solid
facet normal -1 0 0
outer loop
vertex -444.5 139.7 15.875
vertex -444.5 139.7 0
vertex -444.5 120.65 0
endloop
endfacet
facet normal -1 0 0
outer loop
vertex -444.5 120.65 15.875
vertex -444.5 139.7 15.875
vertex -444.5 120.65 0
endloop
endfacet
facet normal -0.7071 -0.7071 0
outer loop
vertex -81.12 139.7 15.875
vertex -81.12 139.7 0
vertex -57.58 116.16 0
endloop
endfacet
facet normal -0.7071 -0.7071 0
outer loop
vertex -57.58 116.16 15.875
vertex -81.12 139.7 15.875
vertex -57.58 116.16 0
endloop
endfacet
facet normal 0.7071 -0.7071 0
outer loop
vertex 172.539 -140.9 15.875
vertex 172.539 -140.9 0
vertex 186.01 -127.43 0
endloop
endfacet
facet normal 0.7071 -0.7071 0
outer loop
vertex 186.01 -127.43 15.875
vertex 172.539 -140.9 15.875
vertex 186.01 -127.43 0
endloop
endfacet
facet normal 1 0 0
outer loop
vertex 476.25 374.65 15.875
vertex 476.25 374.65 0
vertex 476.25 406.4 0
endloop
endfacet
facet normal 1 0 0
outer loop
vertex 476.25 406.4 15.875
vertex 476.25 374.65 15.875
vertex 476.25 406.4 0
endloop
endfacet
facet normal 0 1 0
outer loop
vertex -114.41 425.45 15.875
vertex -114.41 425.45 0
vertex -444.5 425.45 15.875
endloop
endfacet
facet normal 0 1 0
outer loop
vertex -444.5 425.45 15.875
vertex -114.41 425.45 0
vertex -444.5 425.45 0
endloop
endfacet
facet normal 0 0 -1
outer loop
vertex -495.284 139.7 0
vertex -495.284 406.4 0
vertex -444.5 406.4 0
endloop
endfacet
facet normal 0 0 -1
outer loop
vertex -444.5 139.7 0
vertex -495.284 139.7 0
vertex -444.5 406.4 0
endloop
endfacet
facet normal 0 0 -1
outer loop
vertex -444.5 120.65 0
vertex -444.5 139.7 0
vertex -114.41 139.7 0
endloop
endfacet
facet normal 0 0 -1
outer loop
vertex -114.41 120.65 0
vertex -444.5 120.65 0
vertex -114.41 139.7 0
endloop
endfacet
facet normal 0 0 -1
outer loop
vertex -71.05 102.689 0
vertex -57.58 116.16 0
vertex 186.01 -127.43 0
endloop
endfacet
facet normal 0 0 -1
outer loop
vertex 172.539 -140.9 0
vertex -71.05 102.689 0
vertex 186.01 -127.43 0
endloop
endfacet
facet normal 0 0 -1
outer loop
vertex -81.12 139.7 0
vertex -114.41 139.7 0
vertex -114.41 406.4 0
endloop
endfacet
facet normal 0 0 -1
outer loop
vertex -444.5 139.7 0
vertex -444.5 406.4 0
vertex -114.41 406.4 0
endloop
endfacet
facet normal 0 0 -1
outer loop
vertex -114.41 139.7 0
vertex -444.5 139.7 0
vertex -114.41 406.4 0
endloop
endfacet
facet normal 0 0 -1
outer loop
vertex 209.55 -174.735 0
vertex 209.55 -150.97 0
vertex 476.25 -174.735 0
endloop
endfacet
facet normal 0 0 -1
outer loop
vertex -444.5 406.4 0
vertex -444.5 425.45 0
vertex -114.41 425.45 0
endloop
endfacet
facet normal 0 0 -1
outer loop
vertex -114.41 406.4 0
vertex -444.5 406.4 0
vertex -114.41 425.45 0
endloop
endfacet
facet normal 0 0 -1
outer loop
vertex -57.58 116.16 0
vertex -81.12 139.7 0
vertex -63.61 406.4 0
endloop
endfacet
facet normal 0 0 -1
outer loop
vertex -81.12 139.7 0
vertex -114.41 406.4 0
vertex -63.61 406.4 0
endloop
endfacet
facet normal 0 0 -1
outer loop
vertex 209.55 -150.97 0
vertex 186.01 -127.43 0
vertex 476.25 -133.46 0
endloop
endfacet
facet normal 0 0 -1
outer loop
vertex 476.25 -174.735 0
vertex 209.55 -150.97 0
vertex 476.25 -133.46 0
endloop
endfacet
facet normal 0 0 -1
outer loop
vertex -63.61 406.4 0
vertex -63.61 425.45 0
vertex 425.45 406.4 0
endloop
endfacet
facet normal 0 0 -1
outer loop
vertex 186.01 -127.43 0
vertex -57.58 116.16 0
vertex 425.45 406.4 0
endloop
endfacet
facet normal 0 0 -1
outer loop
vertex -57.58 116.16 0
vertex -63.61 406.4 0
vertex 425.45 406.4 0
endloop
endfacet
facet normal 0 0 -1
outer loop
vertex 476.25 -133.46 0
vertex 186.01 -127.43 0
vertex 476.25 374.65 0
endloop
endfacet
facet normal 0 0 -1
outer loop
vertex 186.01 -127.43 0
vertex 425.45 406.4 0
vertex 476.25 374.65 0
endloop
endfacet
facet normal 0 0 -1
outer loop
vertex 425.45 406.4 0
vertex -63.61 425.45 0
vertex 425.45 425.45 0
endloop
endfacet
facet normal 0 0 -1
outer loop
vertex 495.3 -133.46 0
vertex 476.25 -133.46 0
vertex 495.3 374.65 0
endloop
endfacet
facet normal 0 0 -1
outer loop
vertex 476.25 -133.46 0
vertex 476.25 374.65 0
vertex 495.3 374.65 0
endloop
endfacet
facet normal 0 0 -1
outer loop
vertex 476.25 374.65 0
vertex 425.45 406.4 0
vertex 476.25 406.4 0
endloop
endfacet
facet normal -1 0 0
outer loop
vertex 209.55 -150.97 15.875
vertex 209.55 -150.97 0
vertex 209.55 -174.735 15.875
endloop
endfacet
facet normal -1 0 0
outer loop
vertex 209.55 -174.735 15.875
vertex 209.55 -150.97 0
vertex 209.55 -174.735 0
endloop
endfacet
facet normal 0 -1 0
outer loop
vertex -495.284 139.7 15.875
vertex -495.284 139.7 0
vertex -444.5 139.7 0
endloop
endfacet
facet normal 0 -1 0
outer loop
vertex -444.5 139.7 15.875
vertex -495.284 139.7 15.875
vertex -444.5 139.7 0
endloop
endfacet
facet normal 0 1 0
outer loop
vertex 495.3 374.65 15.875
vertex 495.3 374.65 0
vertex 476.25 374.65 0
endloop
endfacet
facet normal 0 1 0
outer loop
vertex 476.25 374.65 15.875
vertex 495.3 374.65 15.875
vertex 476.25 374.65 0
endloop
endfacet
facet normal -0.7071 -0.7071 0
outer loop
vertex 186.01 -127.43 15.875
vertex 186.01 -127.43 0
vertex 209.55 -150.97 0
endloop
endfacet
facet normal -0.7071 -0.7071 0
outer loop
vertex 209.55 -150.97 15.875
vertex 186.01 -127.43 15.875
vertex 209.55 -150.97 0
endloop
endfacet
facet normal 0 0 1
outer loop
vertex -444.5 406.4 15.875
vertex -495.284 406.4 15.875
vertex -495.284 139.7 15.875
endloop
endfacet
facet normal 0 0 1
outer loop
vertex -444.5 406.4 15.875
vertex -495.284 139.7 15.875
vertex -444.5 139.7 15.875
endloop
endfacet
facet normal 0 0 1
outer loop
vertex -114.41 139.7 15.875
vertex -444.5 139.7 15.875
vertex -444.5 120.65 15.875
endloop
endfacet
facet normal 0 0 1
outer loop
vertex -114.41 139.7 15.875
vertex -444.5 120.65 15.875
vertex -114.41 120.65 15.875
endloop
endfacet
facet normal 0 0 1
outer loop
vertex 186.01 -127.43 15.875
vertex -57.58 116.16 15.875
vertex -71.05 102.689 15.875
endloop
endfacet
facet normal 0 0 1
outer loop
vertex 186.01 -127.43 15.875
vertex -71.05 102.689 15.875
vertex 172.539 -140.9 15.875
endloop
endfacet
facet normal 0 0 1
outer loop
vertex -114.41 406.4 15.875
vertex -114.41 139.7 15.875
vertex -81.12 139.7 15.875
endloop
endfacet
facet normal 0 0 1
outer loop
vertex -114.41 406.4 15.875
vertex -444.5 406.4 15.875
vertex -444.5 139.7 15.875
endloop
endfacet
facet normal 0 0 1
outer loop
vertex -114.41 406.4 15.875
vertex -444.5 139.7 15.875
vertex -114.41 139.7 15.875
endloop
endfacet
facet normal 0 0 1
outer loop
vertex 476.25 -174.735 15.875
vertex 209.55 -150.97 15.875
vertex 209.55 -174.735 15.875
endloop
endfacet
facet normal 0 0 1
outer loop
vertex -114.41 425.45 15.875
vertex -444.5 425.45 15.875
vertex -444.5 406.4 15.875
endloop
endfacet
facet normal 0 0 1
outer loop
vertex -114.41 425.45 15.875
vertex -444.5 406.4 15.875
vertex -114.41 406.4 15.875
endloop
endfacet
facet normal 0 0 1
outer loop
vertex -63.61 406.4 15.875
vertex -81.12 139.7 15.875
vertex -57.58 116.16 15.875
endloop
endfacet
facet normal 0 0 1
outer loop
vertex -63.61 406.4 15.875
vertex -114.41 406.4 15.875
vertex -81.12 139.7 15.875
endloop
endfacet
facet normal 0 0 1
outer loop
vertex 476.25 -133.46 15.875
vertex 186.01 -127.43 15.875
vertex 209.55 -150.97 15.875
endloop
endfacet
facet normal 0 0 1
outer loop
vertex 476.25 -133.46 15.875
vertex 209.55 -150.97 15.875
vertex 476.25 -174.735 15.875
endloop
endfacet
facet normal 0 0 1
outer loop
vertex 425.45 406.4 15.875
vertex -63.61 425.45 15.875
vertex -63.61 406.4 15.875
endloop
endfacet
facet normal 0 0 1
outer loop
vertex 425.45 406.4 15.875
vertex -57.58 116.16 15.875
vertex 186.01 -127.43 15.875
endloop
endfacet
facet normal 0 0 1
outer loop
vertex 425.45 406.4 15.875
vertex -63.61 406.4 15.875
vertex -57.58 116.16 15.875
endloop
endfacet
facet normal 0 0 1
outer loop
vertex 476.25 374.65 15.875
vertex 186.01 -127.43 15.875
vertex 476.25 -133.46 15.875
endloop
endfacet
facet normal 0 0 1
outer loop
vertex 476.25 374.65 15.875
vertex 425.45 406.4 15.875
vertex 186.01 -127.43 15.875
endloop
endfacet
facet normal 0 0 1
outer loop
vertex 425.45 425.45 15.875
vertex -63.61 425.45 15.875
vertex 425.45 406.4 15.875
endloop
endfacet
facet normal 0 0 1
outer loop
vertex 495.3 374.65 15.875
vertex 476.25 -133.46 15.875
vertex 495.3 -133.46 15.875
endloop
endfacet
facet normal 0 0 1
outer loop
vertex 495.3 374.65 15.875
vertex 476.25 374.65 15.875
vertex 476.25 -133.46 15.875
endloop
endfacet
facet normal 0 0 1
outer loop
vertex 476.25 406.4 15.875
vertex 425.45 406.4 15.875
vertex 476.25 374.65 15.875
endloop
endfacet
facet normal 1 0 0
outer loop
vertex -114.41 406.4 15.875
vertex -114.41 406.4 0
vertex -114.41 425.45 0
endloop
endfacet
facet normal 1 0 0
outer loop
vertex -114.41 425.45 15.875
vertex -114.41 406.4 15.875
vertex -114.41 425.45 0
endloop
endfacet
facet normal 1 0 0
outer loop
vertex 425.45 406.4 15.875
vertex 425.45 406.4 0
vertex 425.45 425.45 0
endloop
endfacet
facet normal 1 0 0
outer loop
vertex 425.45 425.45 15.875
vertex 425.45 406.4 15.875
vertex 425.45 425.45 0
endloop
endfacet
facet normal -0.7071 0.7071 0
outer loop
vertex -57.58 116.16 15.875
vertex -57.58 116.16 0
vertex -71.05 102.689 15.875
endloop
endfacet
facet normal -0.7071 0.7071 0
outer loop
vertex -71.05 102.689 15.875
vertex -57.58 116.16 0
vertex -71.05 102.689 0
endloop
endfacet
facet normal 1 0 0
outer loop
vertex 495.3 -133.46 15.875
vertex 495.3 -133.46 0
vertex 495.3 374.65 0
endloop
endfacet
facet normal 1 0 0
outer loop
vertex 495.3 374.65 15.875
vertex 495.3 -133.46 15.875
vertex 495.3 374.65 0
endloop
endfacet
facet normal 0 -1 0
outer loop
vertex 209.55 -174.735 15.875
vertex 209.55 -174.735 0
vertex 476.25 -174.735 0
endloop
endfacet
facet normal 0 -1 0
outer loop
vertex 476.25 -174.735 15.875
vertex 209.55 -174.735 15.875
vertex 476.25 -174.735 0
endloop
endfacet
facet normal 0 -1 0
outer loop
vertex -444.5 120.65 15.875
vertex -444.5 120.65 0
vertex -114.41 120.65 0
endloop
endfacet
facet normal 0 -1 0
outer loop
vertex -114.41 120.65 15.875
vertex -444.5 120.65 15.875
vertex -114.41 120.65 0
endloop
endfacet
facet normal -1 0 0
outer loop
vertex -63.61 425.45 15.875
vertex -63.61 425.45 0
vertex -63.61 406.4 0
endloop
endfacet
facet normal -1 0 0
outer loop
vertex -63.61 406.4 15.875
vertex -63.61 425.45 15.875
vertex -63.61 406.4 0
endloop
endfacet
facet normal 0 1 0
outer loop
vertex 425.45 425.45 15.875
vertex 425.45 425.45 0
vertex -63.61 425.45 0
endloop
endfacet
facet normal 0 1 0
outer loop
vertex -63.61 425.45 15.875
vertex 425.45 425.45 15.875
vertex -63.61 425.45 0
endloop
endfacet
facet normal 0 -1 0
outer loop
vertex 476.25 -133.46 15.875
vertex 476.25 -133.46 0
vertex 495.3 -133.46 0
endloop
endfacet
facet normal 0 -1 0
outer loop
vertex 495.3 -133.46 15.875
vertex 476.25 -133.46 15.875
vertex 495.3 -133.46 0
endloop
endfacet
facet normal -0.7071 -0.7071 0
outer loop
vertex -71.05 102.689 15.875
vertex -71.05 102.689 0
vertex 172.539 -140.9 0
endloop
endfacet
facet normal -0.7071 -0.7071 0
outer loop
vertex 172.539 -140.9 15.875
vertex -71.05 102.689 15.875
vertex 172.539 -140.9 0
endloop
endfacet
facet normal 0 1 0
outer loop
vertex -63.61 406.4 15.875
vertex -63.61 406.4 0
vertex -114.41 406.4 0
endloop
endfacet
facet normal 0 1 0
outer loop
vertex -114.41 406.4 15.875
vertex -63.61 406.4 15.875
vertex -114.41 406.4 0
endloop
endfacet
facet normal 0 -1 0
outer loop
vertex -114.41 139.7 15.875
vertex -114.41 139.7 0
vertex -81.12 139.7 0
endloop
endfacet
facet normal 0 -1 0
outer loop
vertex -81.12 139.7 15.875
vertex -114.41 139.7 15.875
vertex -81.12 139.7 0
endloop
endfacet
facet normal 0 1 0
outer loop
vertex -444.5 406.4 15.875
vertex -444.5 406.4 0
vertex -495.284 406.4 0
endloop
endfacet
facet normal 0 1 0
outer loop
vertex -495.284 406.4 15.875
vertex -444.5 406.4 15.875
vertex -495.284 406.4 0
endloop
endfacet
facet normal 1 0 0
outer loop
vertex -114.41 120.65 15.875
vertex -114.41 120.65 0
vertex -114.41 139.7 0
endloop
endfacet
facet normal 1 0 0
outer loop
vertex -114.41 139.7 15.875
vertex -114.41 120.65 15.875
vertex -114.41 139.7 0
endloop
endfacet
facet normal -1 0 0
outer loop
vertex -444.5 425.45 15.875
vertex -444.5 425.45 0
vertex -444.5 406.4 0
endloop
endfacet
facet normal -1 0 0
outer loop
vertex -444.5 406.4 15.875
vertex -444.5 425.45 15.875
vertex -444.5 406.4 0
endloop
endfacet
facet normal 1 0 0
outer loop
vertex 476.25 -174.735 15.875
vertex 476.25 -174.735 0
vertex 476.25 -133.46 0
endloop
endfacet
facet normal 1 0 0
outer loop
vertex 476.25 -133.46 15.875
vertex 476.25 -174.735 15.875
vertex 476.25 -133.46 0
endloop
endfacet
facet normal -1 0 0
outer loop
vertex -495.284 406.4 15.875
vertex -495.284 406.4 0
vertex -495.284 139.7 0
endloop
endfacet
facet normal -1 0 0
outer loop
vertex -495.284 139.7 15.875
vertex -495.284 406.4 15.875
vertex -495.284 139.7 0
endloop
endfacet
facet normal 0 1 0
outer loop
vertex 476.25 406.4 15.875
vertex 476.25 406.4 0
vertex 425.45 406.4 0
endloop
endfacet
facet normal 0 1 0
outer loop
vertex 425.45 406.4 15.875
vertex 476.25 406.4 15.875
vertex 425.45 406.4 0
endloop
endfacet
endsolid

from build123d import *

# Parameters (mm, degrees)
F1_DEPTH = 15.875


with BuildPart() as f1:
    # F0 (on Top) → F1 (new body)
    with BuildSketch(Plane.XY):
        Polygon((-114.410472, 425.45), (-444.5, 425.45), (-444.5, 406.4), (-495.284437, 406.4), (-495.284437, 139.7), (-444.5, 139.7), (-444.5, 120.65), (-114.410472, 120.65), (-114.410472, 139.7), (-81.119703, 139.7), (-57.579575, 116.159872), (-71.04996, 102.689488), (172.539488, -140.89996), (186.009872, -127.429575), (209.55, -150.969703), (209.55, -174.735472), (476.25, -174.735472), (476.25, -133.460472), (495.3, -133.460472), (495.3, 374.65), (476.25, 374.65), (476.25, 406.4), (425.45, 406.4), (425.45, 425.45), (-63.610472, 425.45), (-63.610472, 406.4), (-114.410472, 406.4), align=None)
    extrude(amount=F1_DEPTH)


solid = f1.part
